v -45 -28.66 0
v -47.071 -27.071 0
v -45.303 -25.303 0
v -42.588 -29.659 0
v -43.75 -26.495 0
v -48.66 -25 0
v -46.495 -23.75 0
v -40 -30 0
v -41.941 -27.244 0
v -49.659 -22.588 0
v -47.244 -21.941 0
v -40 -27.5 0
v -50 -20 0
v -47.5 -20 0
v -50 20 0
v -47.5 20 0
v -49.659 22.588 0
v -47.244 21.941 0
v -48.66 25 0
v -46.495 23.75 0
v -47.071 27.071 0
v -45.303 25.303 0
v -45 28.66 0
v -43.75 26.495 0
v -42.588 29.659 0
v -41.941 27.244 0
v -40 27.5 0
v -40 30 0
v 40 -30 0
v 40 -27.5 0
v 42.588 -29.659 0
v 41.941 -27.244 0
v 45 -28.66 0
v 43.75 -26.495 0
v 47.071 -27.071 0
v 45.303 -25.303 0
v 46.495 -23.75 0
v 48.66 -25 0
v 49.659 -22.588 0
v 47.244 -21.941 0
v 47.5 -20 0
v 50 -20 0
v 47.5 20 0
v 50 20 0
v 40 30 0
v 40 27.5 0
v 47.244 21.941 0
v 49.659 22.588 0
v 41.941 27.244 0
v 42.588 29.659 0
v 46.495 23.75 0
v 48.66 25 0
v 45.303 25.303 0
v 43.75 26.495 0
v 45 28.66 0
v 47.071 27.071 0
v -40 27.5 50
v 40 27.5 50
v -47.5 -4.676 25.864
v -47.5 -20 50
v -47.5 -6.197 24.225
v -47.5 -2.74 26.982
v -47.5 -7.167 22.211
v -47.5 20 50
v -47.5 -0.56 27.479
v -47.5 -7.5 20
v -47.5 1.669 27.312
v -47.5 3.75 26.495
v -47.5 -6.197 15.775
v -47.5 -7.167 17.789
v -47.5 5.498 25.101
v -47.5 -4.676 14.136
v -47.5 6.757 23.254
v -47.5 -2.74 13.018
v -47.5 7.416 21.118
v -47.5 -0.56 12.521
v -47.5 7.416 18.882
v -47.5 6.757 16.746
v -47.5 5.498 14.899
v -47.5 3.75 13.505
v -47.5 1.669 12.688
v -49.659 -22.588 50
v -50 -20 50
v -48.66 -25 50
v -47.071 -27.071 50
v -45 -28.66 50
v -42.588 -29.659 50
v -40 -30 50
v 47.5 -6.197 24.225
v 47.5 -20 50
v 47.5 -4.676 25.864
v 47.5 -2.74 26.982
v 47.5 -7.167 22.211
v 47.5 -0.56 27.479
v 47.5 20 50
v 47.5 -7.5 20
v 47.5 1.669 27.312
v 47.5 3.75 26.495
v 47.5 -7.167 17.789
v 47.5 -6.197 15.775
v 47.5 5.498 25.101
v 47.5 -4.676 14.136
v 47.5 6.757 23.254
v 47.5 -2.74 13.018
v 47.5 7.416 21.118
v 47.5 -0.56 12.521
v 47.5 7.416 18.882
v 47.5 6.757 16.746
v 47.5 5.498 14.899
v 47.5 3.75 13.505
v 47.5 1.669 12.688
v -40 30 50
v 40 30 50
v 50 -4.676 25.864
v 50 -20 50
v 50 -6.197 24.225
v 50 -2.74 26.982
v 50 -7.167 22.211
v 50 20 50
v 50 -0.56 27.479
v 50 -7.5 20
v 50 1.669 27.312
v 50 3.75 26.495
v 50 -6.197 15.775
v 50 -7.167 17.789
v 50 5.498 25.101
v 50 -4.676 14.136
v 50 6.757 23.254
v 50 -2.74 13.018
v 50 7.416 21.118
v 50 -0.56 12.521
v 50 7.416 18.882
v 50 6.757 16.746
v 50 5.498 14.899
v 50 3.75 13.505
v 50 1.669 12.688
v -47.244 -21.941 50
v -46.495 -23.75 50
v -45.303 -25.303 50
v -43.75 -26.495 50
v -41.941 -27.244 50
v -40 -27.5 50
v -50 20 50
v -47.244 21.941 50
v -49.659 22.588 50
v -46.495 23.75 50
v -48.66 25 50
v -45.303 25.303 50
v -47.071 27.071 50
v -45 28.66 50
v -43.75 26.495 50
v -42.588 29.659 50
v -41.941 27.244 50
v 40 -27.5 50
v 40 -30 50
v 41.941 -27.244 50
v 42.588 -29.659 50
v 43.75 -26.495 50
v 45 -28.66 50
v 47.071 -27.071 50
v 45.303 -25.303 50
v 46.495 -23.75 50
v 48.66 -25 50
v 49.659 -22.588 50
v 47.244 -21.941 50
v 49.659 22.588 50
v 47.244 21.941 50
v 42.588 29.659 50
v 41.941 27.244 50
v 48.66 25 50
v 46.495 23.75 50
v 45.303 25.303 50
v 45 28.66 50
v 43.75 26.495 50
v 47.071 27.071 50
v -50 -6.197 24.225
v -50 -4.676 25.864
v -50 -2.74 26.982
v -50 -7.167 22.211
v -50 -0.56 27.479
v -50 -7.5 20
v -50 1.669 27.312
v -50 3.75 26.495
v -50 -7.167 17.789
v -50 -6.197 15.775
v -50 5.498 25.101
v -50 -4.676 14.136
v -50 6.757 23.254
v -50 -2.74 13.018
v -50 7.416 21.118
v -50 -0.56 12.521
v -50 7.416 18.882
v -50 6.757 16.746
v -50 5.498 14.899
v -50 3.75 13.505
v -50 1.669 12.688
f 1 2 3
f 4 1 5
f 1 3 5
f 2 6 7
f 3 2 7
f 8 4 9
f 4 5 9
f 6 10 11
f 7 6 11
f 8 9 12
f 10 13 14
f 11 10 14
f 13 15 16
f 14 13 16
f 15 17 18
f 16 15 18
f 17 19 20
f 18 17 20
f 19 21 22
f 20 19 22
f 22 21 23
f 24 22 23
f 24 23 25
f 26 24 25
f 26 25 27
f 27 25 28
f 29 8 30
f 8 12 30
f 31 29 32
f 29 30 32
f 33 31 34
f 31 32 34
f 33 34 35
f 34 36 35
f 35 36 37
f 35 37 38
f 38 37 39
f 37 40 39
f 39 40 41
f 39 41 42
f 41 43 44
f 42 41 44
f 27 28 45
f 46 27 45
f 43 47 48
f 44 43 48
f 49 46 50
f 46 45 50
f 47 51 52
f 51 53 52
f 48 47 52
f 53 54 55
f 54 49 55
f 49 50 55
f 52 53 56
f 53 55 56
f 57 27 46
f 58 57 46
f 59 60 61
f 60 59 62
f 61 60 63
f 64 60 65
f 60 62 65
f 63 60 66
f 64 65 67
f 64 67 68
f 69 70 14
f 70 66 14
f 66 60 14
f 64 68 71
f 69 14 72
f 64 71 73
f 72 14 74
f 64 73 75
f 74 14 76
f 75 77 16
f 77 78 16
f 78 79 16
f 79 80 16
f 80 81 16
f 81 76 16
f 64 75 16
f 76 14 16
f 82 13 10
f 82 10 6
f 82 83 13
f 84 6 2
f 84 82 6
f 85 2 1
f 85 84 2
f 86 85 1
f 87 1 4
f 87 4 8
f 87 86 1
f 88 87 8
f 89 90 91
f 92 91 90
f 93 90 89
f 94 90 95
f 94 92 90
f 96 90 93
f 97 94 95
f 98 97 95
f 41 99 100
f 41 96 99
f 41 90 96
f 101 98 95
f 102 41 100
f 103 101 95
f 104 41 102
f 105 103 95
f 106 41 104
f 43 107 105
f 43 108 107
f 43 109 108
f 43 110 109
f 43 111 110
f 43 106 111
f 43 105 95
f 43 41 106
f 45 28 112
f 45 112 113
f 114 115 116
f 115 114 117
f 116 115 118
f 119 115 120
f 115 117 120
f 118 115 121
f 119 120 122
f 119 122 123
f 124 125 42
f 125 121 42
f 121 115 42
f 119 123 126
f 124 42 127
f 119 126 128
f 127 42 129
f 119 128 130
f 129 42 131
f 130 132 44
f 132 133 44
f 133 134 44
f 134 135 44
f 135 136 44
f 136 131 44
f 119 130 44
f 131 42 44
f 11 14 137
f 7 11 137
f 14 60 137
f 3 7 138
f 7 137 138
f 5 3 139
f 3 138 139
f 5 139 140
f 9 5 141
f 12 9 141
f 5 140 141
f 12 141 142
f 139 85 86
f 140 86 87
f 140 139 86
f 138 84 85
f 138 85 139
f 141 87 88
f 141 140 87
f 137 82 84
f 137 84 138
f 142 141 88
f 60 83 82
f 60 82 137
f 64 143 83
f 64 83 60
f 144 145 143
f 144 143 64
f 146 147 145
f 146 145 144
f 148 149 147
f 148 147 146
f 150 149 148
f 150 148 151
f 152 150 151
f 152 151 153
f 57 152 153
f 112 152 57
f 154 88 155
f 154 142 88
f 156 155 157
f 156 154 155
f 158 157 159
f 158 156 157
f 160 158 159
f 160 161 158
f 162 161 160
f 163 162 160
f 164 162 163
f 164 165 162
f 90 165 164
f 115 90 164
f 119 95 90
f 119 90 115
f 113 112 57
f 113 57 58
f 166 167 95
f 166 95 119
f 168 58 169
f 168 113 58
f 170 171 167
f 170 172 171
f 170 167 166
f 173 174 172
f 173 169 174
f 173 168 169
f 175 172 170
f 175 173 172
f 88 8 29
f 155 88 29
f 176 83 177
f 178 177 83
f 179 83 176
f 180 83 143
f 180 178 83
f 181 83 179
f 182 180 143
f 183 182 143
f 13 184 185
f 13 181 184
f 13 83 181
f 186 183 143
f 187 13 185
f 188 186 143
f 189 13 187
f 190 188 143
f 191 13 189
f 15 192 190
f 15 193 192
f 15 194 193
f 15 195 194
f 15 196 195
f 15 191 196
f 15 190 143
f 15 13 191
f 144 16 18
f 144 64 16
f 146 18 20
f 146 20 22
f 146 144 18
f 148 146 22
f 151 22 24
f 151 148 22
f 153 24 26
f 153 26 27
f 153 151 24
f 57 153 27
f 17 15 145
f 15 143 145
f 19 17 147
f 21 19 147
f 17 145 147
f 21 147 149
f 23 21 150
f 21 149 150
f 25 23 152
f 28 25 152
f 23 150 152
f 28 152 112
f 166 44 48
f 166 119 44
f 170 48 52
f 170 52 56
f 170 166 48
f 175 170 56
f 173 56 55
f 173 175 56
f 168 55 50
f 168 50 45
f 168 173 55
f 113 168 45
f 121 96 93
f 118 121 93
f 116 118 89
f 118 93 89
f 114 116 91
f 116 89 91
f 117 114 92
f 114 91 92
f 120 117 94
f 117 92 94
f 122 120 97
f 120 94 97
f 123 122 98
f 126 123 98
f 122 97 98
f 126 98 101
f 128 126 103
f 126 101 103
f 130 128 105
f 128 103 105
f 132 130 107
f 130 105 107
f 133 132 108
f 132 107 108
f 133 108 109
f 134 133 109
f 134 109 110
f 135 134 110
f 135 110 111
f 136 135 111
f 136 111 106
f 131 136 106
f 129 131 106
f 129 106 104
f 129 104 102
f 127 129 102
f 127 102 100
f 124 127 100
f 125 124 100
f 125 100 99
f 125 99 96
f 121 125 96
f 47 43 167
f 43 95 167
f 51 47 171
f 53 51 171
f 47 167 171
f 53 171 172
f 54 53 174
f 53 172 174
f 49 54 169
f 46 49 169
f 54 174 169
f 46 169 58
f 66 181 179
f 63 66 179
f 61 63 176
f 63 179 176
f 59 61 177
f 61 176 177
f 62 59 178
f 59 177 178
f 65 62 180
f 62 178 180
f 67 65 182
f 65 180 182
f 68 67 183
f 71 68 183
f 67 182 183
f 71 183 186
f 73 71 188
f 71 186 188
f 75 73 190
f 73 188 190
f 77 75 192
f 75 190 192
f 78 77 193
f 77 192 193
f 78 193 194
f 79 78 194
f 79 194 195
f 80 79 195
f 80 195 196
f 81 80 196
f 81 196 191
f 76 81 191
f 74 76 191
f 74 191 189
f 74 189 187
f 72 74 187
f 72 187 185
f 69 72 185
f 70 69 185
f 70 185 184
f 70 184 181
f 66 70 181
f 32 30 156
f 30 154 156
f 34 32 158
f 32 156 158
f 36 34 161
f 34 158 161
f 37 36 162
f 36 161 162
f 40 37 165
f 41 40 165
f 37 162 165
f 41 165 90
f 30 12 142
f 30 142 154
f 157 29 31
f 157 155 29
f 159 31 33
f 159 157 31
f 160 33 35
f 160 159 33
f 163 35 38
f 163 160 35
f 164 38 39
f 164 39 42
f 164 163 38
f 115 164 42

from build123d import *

# Parameters (mm, degrees)
F0_W     = 100
F0_H     = 60
F1_DEPTH = 50
F2_R     = 10
F3_T     = -2.5
F4_R     = 7.5
F5_DEPTH = 119.1


with BuildPart() as f1:
    # F0 (on Top) → F1 (new body)
    with BuildSketch(Plane.XY):
        Rectangle(F0_W, F0_H)
    extrude(amount=F1_DEPTH)

    # F2
    f2_edges = [f1.edges().sort_by_distance(p)[0] for p in [
        (50, -30, 25),
        (50, 30, 25),
        (-50, 30, 25),
        (-50, -30, 25),
    ]]
    fillet(f2_edges, radius=F2_R)

    # F3
    f3_openings = [f1.faces().sort_by_distance(p)[0] for p in [
        (0, 0, 50),
        (0, 0, 0),
    ]]
    offset(amount=F3_T, openings=f3_openings)

    # F4 (on face) → F5 (cut)
    with BuildSketch(Plane(origin=(-50, 0, 0), x_dir=(0, -1, 0), z_dir=(-1, 0, 0))):
        with Locations((0, 20)):
            Circle(F4_R)
    extrude(amount=-F5_DEPTH, mode=Mode.SUBTRACT)


solid = f1.part
